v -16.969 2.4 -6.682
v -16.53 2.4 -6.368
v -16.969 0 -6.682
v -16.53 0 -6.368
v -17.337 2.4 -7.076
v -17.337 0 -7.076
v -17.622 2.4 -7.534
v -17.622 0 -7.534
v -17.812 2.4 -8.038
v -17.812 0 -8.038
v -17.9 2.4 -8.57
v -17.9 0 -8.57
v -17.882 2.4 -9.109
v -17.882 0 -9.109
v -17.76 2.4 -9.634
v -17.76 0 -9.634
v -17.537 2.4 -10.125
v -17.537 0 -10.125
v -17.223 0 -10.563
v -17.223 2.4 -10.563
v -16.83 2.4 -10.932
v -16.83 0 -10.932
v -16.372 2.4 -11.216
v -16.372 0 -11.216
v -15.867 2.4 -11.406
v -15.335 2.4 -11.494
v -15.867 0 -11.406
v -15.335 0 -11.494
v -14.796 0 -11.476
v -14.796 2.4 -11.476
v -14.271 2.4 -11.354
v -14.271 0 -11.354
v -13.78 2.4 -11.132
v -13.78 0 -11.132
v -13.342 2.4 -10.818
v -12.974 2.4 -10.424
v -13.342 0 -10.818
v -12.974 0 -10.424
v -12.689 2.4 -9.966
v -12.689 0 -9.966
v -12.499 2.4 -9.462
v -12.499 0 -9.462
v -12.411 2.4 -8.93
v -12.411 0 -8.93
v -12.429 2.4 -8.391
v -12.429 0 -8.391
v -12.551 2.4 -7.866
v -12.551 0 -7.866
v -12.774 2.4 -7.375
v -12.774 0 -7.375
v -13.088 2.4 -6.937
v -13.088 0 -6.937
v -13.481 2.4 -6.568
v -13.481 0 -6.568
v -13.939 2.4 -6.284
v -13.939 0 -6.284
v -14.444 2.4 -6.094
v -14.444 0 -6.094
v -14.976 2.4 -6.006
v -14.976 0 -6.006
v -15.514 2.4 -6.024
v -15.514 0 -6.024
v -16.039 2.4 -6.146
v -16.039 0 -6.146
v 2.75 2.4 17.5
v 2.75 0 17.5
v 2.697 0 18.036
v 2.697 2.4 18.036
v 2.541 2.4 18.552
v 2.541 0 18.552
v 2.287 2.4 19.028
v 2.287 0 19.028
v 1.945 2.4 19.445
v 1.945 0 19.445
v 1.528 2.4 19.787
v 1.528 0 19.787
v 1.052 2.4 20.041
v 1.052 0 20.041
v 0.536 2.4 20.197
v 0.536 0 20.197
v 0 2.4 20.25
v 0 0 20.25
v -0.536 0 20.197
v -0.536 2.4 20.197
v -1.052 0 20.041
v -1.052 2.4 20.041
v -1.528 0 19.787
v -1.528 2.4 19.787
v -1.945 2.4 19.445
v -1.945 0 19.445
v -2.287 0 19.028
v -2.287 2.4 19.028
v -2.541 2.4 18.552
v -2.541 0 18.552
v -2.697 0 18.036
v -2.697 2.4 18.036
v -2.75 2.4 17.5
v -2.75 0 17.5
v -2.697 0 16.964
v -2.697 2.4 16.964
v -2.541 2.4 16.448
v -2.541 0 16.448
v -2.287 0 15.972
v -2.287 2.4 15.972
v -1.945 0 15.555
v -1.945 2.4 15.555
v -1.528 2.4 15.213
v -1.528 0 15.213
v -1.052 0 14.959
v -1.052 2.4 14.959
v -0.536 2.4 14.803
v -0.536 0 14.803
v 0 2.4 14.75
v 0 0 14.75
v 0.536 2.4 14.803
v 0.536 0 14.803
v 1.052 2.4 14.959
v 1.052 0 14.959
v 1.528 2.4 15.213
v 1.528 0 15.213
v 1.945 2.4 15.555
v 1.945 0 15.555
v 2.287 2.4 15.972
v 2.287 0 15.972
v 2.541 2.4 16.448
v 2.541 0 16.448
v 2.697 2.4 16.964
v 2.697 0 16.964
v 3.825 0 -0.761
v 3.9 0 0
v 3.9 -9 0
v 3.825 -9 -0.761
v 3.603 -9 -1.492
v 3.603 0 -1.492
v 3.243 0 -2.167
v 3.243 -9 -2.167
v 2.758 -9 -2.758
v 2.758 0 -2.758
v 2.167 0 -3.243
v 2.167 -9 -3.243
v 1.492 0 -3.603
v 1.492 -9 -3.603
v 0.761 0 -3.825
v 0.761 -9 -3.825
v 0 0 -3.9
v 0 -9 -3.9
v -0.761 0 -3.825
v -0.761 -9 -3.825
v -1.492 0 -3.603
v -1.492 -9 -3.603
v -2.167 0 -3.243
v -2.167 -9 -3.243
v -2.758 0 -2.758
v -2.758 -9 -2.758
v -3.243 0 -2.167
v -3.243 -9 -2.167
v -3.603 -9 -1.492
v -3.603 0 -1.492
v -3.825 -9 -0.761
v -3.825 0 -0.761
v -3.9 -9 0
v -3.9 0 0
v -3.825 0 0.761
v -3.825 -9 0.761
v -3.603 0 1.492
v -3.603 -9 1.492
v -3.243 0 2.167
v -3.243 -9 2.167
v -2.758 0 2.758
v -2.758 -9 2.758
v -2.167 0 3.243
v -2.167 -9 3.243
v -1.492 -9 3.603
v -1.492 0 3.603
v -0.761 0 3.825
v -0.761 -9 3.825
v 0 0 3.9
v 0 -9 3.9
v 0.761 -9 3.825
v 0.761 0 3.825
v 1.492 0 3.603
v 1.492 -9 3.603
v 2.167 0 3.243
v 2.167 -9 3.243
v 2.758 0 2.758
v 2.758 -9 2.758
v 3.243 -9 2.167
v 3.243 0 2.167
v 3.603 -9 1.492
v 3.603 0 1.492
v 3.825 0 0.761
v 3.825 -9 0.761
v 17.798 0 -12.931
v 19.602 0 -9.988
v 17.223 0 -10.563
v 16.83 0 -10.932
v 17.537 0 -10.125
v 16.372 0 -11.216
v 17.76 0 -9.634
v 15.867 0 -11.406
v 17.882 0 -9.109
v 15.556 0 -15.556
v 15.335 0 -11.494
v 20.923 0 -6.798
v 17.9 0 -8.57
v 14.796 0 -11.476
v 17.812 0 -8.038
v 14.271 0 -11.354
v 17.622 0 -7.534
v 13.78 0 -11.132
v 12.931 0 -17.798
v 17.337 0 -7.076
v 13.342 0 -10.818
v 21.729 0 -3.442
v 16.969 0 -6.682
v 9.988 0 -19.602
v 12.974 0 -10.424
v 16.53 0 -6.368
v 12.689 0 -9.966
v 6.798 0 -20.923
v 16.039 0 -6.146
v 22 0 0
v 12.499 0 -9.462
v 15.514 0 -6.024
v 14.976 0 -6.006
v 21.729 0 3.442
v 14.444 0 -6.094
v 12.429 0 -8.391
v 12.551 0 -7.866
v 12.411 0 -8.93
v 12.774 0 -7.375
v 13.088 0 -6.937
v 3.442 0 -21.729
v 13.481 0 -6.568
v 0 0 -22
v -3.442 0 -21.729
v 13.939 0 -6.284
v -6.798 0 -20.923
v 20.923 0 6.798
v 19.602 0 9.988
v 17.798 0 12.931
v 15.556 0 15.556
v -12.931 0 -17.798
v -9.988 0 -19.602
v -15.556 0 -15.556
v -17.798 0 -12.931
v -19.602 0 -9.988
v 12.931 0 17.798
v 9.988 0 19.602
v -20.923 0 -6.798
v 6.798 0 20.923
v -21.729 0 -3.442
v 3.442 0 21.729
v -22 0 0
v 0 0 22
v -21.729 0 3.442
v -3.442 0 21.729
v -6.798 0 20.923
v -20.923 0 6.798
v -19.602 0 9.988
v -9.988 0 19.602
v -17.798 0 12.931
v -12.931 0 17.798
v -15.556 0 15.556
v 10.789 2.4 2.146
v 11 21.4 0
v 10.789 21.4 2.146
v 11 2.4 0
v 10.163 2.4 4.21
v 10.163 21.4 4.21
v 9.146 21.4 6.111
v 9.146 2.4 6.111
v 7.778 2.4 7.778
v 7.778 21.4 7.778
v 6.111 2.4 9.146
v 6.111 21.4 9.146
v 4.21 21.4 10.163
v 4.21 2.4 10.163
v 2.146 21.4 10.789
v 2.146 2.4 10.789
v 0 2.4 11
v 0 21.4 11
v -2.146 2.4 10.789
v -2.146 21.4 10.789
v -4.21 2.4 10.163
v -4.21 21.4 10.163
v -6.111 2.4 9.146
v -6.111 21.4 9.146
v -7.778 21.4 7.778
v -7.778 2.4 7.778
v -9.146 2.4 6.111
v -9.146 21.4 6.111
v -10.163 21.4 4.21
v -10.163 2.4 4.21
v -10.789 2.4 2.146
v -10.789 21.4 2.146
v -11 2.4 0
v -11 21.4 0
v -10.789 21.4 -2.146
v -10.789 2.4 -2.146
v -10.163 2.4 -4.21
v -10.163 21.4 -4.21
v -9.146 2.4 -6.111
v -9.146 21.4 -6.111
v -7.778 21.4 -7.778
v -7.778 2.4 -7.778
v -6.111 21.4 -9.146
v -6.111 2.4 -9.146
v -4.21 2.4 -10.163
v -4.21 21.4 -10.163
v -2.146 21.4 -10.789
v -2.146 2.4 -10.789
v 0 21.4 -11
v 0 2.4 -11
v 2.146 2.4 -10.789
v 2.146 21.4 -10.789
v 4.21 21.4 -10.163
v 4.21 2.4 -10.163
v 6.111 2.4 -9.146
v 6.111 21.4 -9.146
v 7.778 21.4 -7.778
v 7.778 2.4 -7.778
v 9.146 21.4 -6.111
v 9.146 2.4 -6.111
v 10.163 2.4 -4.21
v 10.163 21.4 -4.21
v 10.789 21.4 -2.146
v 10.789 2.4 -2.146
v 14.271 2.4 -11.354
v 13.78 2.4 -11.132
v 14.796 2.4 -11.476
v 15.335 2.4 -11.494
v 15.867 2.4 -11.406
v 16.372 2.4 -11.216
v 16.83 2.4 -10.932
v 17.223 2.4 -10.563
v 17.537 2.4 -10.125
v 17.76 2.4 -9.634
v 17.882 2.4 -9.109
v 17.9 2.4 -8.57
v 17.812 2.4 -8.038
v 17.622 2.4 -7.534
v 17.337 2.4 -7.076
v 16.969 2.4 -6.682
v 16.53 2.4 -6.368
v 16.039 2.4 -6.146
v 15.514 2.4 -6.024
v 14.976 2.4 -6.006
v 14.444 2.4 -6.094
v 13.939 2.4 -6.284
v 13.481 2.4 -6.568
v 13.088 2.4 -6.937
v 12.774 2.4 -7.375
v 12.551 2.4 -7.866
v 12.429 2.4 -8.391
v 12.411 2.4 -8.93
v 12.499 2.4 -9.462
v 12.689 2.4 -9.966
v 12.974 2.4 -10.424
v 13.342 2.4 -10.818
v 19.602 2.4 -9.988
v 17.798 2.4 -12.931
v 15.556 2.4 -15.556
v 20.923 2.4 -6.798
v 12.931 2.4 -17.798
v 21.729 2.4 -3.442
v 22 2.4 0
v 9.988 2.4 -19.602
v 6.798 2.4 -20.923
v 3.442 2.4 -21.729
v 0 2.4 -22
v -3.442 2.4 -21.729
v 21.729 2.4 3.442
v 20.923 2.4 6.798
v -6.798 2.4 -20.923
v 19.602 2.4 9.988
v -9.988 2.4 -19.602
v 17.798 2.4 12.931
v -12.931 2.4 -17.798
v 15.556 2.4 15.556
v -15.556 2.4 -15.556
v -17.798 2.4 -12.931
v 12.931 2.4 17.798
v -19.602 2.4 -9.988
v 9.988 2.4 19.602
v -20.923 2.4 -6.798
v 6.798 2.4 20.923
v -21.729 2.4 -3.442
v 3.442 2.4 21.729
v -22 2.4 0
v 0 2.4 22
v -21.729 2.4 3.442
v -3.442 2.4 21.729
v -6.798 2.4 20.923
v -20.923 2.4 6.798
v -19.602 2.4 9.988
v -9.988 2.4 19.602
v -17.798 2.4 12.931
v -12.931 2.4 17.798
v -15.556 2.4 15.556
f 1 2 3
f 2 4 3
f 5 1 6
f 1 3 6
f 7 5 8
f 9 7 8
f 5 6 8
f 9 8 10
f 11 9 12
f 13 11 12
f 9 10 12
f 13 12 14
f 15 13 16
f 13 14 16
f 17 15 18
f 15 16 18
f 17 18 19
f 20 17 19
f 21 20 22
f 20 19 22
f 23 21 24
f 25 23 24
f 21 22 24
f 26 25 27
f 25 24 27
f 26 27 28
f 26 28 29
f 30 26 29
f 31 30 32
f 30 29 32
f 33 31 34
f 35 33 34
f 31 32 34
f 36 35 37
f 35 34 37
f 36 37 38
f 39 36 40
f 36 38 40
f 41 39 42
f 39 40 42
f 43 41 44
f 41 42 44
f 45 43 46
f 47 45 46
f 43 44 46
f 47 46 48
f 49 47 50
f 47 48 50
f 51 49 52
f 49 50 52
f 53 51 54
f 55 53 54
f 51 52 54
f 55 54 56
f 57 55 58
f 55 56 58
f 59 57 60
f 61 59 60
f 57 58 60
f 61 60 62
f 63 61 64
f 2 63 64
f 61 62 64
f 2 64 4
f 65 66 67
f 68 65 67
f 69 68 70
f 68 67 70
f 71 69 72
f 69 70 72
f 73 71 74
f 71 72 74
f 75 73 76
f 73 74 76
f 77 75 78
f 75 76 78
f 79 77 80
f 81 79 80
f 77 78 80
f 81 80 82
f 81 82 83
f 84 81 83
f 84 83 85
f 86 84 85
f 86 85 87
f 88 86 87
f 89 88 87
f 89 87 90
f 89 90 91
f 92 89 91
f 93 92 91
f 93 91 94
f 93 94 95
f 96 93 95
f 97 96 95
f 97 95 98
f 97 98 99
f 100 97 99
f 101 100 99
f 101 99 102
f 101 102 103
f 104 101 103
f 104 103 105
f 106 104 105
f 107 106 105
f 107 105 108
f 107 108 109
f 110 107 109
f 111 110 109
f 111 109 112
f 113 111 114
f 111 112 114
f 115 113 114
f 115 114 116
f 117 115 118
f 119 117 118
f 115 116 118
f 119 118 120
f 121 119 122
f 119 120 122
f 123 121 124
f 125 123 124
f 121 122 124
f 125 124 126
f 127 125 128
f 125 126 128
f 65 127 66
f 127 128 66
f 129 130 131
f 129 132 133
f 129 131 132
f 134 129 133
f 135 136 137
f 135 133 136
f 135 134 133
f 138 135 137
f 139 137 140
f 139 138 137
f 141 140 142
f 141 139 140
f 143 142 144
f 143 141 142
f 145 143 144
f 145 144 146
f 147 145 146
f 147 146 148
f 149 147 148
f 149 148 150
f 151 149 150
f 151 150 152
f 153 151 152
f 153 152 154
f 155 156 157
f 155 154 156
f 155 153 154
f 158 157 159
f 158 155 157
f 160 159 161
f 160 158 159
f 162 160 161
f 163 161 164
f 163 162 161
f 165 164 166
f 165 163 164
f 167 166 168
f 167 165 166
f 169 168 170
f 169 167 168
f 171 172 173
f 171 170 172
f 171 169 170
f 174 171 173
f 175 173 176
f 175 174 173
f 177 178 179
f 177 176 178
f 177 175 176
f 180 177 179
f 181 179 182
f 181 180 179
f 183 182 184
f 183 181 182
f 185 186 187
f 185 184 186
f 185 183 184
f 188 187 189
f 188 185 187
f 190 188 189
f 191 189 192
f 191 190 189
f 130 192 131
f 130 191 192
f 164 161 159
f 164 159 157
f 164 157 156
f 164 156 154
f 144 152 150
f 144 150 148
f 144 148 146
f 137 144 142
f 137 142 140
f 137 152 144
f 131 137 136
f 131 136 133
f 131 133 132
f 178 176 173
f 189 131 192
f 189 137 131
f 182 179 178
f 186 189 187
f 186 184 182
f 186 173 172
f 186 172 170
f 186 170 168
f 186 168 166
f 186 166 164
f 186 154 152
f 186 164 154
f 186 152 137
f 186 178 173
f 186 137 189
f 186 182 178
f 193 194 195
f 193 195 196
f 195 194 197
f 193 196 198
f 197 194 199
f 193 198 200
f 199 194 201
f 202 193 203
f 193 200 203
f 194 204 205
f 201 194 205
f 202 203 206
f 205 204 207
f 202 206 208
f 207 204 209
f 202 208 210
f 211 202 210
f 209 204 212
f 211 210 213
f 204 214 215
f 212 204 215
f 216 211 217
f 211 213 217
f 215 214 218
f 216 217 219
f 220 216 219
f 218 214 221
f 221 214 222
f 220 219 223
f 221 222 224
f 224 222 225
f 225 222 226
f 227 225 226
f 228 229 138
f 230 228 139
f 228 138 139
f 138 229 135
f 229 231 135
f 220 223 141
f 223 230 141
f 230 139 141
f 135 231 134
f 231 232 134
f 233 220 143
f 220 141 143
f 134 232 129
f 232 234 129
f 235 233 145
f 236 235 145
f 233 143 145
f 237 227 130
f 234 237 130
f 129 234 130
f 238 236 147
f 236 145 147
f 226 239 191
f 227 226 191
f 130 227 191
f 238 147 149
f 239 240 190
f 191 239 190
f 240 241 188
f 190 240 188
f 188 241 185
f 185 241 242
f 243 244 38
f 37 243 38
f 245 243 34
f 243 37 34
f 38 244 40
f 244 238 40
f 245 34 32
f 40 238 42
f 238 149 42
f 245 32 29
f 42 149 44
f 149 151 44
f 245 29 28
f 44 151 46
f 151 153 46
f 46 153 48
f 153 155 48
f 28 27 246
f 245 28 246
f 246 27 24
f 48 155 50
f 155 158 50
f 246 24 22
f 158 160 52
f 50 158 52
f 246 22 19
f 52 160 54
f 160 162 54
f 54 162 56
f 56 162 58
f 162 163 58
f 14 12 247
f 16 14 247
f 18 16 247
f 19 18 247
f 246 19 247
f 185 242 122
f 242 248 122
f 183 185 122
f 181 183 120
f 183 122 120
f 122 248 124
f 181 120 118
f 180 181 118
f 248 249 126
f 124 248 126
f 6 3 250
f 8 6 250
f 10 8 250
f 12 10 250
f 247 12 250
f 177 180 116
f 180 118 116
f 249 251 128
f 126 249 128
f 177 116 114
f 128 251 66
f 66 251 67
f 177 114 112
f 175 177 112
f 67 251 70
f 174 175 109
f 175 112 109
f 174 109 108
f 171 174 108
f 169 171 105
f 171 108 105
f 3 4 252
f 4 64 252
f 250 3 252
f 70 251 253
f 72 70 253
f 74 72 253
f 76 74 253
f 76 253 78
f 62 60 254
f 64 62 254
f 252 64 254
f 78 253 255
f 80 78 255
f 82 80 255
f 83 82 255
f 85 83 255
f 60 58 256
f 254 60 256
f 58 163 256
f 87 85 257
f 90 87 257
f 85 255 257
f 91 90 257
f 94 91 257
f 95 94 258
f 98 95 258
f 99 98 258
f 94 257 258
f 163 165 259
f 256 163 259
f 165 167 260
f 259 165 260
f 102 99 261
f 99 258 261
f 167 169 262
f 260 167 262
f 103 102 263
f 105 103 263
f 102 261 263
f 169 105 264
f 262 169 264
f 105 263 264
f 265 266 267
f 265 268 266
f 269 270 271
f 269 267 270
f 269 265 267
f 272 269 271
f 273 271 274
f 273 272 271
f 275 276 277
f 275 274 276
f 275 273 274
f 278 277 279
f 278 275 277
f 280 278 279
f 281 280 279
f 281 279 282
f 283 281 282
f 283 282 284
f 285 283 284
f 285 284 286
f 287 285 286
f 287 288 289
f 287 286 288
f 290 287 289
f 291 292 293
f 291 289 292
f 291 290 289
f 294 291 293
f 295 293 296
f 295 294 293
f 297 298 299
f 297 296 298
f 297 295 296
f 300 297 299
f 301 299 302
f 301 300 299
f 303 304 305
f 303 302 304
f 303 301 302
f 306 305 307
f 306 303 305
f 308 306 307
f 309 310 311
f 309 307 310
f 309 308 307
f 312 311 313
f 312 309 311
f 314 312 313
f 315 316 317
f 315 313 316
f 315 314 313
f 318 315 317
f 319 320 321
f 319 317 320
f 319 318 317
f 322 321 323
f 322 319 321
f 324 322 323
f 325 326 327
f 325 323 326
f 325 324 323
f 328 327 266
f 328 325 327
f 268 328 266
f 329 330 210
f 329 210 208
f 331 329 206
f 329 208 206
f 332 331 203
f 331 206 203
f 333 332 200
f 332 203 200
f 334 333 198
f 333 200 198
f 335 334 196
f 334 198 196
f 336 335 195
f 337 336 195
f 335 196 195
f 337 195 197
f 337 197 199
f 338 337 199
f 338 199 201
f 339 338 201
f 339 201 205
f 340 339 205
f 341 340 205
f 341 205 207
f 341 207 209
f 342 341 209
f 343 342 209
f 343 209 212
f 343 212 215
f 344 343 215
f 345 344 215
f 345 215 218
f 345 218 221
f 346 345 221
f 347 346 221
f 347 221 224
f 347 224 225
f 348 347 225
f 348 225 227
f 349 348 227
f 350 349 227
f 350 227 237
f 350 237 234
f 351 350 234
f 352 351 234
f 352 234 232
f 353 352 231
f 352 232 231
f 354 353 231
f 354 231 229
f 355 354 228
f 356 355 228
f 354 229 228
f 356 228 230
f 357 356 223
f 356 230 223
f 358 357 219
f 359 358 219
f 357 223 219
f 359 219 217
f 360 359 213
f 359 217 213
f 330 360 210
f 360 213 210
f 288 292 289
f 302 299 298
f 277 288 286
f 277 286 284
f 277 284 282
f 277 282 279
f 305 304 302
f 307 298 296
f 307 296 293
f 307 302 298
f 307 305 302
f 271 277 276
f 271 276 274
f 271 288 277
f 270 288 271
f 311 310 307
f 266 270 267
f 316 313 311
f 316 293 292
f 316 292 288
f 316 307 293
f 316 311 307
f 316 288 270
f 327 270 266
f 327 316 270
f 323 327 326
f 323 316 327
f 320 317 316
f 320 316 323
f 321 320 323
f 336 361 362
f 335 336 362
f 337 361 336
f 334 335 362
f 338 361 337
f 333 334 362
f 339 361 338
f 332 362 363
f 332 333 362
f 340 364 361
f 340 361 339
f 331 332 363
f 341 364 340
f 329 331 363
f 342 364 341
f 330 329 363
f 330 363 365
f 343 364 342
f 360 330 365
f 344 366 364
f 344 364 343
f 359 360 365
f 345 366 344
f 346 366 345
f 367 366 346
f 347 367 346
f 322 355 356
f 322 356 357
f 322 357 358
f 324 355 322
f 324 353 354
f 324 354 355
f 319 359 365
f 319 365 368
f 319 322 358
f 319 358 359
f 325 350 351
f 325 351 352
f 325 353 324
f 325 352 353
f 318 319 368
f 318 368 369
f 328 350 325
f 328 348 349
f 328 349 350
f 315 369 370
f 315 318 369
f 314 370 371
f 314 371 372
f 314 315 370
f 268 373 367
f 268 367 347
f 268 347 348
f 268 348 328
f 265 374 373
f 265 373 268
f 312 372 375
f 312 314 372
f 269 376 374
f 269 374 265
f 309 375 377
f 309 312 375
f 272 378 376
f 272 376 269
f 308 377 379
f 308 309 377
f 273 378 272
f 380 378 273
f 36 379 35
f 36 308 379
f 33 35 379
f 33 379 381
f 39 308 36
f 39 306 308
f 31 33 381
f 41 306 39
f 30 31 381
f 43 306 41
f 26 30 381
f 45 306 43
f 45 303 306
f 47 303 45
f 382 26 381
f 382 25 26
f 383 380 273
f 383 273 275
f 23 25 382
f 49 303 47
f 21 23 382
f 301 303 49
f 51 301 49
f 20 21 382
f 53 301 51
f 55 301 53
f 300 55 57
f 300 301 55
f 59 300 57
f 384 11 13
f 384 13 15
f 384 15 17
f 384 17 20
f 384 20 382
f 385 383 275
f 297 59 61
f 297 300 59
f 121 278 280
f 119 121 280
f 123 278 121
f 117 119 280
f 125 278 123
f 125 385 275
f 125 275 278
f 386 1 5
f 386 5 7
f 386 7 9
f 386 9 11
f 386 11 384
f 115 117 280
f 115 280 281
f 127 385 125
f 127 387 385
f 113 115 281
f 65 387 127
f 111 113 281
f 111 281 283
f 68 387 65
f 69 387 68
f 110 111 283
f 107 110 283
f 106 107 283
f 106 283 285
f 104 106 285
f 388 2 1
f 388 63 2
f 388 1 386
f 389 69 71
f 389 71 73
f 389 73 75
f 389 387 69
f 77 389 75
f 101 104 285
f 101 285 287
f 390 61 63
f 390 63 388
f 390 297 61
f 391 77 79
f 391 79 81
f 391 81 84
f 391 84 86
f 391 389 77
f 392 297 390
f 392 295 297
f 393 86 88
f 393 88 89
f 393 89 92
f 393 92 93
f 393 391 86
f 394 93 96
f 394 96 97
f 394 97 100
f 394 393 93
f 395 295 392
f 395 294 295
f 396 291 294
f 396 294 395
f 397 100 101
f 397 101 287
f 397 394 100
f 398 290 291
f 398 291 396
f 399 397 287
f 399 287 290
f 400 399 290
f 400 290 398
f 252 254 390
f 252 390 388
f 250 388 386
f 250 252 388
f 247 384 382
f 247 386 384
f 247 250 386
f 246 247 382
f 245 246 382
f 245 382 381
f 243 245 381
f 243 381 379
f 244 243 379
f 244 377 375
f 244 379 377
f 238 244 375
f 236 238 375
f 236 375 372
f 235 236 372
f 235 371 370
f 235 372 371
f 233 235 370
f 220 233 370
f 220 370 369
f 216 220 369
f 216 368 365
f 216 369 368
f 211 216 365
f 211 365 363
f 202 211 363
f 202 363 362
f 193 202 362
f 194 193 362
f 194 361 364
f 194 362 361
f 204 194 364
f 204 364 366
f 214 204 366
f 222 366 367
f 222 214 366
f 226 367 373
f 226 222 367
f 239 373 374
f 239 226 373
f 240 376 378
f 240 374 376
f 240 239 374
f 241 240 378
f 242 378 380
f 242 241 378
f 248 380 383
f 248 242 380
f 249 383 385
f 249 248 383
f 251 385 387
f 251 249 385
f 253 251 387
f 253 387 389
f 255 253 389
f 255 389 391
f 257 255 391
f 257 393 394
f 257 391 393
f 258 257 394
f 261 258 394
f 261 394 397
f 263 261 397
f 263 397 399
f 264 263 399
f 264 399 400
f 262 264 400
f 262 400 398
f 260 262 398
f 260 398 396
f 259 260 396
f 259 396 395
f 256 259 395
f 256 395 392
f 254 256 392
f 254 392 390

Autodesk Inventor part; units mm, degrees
ref_plane "YZ Plane" through (0, 0, 0) normal (1, 0, 0) x (0, 1, 0)
ref_plane "XZ Plane" through (0, 0, 0) normal (0, 1, 0) x (-1, 0, 0)
ref_plane "XY Plane" through (0, 0, 0) normal (0, 0, 1) x (1, 0, 0)
sketch "Esquisse1" plane through (0, 0, 0) normal (0, 1, 0) x (-1, 0, 0)
  circle A0 centre (0, 0) radius 22
  dimension "d0" = 44
extrude "Extrusion1" add sketch "Esquisse1" along normal blind 2.4
sketch "Esquisse2" plane through (0, 2.4, 0) normal (0, 1, 0) x (1, 0, 0)
  circle A0 centre (0, 0) radius 22 projected
  circle A1 centre (0, 0) radius 11
  dimension "d3" = 22
extrude "Extrusion2" add sketch "Esquisse2" along normal blind 19 contours A1
sketch "Esquisse4" plane through (0, 0, 0) normal (0, -1, 0) x (1, 0, 0)
  circle A0 centre (0, 0) radius 22 projected
  circle A1 centre (0, 17.5) radius 2.75
  dimension "d6" = 5.5
  dimension "d7" = 17.5
extrude "Extrusion3" cut sketch "Esquisse4" against normal through all contours A1
pattern_circular "Réseau circulaire1" count 3 over 360 about axis through (0, 2.4, 0) along (0, 1, 0) of "Extrusion3"
sketch "Esquisse5" plane through (0, 0, 0) normal (0, -1, 0) x (1, 0, 0)
  circle A0 centre (0, 0) radius 22 projected
  circle A1 centre (0, 0) radius 3.9
  dimension "d13" = 7.8
extrude "Extrusion4" add sketch "Esquisse5" along normal blind 9 contours A1
properties part number "SRC022" material "Plastique ABS"
